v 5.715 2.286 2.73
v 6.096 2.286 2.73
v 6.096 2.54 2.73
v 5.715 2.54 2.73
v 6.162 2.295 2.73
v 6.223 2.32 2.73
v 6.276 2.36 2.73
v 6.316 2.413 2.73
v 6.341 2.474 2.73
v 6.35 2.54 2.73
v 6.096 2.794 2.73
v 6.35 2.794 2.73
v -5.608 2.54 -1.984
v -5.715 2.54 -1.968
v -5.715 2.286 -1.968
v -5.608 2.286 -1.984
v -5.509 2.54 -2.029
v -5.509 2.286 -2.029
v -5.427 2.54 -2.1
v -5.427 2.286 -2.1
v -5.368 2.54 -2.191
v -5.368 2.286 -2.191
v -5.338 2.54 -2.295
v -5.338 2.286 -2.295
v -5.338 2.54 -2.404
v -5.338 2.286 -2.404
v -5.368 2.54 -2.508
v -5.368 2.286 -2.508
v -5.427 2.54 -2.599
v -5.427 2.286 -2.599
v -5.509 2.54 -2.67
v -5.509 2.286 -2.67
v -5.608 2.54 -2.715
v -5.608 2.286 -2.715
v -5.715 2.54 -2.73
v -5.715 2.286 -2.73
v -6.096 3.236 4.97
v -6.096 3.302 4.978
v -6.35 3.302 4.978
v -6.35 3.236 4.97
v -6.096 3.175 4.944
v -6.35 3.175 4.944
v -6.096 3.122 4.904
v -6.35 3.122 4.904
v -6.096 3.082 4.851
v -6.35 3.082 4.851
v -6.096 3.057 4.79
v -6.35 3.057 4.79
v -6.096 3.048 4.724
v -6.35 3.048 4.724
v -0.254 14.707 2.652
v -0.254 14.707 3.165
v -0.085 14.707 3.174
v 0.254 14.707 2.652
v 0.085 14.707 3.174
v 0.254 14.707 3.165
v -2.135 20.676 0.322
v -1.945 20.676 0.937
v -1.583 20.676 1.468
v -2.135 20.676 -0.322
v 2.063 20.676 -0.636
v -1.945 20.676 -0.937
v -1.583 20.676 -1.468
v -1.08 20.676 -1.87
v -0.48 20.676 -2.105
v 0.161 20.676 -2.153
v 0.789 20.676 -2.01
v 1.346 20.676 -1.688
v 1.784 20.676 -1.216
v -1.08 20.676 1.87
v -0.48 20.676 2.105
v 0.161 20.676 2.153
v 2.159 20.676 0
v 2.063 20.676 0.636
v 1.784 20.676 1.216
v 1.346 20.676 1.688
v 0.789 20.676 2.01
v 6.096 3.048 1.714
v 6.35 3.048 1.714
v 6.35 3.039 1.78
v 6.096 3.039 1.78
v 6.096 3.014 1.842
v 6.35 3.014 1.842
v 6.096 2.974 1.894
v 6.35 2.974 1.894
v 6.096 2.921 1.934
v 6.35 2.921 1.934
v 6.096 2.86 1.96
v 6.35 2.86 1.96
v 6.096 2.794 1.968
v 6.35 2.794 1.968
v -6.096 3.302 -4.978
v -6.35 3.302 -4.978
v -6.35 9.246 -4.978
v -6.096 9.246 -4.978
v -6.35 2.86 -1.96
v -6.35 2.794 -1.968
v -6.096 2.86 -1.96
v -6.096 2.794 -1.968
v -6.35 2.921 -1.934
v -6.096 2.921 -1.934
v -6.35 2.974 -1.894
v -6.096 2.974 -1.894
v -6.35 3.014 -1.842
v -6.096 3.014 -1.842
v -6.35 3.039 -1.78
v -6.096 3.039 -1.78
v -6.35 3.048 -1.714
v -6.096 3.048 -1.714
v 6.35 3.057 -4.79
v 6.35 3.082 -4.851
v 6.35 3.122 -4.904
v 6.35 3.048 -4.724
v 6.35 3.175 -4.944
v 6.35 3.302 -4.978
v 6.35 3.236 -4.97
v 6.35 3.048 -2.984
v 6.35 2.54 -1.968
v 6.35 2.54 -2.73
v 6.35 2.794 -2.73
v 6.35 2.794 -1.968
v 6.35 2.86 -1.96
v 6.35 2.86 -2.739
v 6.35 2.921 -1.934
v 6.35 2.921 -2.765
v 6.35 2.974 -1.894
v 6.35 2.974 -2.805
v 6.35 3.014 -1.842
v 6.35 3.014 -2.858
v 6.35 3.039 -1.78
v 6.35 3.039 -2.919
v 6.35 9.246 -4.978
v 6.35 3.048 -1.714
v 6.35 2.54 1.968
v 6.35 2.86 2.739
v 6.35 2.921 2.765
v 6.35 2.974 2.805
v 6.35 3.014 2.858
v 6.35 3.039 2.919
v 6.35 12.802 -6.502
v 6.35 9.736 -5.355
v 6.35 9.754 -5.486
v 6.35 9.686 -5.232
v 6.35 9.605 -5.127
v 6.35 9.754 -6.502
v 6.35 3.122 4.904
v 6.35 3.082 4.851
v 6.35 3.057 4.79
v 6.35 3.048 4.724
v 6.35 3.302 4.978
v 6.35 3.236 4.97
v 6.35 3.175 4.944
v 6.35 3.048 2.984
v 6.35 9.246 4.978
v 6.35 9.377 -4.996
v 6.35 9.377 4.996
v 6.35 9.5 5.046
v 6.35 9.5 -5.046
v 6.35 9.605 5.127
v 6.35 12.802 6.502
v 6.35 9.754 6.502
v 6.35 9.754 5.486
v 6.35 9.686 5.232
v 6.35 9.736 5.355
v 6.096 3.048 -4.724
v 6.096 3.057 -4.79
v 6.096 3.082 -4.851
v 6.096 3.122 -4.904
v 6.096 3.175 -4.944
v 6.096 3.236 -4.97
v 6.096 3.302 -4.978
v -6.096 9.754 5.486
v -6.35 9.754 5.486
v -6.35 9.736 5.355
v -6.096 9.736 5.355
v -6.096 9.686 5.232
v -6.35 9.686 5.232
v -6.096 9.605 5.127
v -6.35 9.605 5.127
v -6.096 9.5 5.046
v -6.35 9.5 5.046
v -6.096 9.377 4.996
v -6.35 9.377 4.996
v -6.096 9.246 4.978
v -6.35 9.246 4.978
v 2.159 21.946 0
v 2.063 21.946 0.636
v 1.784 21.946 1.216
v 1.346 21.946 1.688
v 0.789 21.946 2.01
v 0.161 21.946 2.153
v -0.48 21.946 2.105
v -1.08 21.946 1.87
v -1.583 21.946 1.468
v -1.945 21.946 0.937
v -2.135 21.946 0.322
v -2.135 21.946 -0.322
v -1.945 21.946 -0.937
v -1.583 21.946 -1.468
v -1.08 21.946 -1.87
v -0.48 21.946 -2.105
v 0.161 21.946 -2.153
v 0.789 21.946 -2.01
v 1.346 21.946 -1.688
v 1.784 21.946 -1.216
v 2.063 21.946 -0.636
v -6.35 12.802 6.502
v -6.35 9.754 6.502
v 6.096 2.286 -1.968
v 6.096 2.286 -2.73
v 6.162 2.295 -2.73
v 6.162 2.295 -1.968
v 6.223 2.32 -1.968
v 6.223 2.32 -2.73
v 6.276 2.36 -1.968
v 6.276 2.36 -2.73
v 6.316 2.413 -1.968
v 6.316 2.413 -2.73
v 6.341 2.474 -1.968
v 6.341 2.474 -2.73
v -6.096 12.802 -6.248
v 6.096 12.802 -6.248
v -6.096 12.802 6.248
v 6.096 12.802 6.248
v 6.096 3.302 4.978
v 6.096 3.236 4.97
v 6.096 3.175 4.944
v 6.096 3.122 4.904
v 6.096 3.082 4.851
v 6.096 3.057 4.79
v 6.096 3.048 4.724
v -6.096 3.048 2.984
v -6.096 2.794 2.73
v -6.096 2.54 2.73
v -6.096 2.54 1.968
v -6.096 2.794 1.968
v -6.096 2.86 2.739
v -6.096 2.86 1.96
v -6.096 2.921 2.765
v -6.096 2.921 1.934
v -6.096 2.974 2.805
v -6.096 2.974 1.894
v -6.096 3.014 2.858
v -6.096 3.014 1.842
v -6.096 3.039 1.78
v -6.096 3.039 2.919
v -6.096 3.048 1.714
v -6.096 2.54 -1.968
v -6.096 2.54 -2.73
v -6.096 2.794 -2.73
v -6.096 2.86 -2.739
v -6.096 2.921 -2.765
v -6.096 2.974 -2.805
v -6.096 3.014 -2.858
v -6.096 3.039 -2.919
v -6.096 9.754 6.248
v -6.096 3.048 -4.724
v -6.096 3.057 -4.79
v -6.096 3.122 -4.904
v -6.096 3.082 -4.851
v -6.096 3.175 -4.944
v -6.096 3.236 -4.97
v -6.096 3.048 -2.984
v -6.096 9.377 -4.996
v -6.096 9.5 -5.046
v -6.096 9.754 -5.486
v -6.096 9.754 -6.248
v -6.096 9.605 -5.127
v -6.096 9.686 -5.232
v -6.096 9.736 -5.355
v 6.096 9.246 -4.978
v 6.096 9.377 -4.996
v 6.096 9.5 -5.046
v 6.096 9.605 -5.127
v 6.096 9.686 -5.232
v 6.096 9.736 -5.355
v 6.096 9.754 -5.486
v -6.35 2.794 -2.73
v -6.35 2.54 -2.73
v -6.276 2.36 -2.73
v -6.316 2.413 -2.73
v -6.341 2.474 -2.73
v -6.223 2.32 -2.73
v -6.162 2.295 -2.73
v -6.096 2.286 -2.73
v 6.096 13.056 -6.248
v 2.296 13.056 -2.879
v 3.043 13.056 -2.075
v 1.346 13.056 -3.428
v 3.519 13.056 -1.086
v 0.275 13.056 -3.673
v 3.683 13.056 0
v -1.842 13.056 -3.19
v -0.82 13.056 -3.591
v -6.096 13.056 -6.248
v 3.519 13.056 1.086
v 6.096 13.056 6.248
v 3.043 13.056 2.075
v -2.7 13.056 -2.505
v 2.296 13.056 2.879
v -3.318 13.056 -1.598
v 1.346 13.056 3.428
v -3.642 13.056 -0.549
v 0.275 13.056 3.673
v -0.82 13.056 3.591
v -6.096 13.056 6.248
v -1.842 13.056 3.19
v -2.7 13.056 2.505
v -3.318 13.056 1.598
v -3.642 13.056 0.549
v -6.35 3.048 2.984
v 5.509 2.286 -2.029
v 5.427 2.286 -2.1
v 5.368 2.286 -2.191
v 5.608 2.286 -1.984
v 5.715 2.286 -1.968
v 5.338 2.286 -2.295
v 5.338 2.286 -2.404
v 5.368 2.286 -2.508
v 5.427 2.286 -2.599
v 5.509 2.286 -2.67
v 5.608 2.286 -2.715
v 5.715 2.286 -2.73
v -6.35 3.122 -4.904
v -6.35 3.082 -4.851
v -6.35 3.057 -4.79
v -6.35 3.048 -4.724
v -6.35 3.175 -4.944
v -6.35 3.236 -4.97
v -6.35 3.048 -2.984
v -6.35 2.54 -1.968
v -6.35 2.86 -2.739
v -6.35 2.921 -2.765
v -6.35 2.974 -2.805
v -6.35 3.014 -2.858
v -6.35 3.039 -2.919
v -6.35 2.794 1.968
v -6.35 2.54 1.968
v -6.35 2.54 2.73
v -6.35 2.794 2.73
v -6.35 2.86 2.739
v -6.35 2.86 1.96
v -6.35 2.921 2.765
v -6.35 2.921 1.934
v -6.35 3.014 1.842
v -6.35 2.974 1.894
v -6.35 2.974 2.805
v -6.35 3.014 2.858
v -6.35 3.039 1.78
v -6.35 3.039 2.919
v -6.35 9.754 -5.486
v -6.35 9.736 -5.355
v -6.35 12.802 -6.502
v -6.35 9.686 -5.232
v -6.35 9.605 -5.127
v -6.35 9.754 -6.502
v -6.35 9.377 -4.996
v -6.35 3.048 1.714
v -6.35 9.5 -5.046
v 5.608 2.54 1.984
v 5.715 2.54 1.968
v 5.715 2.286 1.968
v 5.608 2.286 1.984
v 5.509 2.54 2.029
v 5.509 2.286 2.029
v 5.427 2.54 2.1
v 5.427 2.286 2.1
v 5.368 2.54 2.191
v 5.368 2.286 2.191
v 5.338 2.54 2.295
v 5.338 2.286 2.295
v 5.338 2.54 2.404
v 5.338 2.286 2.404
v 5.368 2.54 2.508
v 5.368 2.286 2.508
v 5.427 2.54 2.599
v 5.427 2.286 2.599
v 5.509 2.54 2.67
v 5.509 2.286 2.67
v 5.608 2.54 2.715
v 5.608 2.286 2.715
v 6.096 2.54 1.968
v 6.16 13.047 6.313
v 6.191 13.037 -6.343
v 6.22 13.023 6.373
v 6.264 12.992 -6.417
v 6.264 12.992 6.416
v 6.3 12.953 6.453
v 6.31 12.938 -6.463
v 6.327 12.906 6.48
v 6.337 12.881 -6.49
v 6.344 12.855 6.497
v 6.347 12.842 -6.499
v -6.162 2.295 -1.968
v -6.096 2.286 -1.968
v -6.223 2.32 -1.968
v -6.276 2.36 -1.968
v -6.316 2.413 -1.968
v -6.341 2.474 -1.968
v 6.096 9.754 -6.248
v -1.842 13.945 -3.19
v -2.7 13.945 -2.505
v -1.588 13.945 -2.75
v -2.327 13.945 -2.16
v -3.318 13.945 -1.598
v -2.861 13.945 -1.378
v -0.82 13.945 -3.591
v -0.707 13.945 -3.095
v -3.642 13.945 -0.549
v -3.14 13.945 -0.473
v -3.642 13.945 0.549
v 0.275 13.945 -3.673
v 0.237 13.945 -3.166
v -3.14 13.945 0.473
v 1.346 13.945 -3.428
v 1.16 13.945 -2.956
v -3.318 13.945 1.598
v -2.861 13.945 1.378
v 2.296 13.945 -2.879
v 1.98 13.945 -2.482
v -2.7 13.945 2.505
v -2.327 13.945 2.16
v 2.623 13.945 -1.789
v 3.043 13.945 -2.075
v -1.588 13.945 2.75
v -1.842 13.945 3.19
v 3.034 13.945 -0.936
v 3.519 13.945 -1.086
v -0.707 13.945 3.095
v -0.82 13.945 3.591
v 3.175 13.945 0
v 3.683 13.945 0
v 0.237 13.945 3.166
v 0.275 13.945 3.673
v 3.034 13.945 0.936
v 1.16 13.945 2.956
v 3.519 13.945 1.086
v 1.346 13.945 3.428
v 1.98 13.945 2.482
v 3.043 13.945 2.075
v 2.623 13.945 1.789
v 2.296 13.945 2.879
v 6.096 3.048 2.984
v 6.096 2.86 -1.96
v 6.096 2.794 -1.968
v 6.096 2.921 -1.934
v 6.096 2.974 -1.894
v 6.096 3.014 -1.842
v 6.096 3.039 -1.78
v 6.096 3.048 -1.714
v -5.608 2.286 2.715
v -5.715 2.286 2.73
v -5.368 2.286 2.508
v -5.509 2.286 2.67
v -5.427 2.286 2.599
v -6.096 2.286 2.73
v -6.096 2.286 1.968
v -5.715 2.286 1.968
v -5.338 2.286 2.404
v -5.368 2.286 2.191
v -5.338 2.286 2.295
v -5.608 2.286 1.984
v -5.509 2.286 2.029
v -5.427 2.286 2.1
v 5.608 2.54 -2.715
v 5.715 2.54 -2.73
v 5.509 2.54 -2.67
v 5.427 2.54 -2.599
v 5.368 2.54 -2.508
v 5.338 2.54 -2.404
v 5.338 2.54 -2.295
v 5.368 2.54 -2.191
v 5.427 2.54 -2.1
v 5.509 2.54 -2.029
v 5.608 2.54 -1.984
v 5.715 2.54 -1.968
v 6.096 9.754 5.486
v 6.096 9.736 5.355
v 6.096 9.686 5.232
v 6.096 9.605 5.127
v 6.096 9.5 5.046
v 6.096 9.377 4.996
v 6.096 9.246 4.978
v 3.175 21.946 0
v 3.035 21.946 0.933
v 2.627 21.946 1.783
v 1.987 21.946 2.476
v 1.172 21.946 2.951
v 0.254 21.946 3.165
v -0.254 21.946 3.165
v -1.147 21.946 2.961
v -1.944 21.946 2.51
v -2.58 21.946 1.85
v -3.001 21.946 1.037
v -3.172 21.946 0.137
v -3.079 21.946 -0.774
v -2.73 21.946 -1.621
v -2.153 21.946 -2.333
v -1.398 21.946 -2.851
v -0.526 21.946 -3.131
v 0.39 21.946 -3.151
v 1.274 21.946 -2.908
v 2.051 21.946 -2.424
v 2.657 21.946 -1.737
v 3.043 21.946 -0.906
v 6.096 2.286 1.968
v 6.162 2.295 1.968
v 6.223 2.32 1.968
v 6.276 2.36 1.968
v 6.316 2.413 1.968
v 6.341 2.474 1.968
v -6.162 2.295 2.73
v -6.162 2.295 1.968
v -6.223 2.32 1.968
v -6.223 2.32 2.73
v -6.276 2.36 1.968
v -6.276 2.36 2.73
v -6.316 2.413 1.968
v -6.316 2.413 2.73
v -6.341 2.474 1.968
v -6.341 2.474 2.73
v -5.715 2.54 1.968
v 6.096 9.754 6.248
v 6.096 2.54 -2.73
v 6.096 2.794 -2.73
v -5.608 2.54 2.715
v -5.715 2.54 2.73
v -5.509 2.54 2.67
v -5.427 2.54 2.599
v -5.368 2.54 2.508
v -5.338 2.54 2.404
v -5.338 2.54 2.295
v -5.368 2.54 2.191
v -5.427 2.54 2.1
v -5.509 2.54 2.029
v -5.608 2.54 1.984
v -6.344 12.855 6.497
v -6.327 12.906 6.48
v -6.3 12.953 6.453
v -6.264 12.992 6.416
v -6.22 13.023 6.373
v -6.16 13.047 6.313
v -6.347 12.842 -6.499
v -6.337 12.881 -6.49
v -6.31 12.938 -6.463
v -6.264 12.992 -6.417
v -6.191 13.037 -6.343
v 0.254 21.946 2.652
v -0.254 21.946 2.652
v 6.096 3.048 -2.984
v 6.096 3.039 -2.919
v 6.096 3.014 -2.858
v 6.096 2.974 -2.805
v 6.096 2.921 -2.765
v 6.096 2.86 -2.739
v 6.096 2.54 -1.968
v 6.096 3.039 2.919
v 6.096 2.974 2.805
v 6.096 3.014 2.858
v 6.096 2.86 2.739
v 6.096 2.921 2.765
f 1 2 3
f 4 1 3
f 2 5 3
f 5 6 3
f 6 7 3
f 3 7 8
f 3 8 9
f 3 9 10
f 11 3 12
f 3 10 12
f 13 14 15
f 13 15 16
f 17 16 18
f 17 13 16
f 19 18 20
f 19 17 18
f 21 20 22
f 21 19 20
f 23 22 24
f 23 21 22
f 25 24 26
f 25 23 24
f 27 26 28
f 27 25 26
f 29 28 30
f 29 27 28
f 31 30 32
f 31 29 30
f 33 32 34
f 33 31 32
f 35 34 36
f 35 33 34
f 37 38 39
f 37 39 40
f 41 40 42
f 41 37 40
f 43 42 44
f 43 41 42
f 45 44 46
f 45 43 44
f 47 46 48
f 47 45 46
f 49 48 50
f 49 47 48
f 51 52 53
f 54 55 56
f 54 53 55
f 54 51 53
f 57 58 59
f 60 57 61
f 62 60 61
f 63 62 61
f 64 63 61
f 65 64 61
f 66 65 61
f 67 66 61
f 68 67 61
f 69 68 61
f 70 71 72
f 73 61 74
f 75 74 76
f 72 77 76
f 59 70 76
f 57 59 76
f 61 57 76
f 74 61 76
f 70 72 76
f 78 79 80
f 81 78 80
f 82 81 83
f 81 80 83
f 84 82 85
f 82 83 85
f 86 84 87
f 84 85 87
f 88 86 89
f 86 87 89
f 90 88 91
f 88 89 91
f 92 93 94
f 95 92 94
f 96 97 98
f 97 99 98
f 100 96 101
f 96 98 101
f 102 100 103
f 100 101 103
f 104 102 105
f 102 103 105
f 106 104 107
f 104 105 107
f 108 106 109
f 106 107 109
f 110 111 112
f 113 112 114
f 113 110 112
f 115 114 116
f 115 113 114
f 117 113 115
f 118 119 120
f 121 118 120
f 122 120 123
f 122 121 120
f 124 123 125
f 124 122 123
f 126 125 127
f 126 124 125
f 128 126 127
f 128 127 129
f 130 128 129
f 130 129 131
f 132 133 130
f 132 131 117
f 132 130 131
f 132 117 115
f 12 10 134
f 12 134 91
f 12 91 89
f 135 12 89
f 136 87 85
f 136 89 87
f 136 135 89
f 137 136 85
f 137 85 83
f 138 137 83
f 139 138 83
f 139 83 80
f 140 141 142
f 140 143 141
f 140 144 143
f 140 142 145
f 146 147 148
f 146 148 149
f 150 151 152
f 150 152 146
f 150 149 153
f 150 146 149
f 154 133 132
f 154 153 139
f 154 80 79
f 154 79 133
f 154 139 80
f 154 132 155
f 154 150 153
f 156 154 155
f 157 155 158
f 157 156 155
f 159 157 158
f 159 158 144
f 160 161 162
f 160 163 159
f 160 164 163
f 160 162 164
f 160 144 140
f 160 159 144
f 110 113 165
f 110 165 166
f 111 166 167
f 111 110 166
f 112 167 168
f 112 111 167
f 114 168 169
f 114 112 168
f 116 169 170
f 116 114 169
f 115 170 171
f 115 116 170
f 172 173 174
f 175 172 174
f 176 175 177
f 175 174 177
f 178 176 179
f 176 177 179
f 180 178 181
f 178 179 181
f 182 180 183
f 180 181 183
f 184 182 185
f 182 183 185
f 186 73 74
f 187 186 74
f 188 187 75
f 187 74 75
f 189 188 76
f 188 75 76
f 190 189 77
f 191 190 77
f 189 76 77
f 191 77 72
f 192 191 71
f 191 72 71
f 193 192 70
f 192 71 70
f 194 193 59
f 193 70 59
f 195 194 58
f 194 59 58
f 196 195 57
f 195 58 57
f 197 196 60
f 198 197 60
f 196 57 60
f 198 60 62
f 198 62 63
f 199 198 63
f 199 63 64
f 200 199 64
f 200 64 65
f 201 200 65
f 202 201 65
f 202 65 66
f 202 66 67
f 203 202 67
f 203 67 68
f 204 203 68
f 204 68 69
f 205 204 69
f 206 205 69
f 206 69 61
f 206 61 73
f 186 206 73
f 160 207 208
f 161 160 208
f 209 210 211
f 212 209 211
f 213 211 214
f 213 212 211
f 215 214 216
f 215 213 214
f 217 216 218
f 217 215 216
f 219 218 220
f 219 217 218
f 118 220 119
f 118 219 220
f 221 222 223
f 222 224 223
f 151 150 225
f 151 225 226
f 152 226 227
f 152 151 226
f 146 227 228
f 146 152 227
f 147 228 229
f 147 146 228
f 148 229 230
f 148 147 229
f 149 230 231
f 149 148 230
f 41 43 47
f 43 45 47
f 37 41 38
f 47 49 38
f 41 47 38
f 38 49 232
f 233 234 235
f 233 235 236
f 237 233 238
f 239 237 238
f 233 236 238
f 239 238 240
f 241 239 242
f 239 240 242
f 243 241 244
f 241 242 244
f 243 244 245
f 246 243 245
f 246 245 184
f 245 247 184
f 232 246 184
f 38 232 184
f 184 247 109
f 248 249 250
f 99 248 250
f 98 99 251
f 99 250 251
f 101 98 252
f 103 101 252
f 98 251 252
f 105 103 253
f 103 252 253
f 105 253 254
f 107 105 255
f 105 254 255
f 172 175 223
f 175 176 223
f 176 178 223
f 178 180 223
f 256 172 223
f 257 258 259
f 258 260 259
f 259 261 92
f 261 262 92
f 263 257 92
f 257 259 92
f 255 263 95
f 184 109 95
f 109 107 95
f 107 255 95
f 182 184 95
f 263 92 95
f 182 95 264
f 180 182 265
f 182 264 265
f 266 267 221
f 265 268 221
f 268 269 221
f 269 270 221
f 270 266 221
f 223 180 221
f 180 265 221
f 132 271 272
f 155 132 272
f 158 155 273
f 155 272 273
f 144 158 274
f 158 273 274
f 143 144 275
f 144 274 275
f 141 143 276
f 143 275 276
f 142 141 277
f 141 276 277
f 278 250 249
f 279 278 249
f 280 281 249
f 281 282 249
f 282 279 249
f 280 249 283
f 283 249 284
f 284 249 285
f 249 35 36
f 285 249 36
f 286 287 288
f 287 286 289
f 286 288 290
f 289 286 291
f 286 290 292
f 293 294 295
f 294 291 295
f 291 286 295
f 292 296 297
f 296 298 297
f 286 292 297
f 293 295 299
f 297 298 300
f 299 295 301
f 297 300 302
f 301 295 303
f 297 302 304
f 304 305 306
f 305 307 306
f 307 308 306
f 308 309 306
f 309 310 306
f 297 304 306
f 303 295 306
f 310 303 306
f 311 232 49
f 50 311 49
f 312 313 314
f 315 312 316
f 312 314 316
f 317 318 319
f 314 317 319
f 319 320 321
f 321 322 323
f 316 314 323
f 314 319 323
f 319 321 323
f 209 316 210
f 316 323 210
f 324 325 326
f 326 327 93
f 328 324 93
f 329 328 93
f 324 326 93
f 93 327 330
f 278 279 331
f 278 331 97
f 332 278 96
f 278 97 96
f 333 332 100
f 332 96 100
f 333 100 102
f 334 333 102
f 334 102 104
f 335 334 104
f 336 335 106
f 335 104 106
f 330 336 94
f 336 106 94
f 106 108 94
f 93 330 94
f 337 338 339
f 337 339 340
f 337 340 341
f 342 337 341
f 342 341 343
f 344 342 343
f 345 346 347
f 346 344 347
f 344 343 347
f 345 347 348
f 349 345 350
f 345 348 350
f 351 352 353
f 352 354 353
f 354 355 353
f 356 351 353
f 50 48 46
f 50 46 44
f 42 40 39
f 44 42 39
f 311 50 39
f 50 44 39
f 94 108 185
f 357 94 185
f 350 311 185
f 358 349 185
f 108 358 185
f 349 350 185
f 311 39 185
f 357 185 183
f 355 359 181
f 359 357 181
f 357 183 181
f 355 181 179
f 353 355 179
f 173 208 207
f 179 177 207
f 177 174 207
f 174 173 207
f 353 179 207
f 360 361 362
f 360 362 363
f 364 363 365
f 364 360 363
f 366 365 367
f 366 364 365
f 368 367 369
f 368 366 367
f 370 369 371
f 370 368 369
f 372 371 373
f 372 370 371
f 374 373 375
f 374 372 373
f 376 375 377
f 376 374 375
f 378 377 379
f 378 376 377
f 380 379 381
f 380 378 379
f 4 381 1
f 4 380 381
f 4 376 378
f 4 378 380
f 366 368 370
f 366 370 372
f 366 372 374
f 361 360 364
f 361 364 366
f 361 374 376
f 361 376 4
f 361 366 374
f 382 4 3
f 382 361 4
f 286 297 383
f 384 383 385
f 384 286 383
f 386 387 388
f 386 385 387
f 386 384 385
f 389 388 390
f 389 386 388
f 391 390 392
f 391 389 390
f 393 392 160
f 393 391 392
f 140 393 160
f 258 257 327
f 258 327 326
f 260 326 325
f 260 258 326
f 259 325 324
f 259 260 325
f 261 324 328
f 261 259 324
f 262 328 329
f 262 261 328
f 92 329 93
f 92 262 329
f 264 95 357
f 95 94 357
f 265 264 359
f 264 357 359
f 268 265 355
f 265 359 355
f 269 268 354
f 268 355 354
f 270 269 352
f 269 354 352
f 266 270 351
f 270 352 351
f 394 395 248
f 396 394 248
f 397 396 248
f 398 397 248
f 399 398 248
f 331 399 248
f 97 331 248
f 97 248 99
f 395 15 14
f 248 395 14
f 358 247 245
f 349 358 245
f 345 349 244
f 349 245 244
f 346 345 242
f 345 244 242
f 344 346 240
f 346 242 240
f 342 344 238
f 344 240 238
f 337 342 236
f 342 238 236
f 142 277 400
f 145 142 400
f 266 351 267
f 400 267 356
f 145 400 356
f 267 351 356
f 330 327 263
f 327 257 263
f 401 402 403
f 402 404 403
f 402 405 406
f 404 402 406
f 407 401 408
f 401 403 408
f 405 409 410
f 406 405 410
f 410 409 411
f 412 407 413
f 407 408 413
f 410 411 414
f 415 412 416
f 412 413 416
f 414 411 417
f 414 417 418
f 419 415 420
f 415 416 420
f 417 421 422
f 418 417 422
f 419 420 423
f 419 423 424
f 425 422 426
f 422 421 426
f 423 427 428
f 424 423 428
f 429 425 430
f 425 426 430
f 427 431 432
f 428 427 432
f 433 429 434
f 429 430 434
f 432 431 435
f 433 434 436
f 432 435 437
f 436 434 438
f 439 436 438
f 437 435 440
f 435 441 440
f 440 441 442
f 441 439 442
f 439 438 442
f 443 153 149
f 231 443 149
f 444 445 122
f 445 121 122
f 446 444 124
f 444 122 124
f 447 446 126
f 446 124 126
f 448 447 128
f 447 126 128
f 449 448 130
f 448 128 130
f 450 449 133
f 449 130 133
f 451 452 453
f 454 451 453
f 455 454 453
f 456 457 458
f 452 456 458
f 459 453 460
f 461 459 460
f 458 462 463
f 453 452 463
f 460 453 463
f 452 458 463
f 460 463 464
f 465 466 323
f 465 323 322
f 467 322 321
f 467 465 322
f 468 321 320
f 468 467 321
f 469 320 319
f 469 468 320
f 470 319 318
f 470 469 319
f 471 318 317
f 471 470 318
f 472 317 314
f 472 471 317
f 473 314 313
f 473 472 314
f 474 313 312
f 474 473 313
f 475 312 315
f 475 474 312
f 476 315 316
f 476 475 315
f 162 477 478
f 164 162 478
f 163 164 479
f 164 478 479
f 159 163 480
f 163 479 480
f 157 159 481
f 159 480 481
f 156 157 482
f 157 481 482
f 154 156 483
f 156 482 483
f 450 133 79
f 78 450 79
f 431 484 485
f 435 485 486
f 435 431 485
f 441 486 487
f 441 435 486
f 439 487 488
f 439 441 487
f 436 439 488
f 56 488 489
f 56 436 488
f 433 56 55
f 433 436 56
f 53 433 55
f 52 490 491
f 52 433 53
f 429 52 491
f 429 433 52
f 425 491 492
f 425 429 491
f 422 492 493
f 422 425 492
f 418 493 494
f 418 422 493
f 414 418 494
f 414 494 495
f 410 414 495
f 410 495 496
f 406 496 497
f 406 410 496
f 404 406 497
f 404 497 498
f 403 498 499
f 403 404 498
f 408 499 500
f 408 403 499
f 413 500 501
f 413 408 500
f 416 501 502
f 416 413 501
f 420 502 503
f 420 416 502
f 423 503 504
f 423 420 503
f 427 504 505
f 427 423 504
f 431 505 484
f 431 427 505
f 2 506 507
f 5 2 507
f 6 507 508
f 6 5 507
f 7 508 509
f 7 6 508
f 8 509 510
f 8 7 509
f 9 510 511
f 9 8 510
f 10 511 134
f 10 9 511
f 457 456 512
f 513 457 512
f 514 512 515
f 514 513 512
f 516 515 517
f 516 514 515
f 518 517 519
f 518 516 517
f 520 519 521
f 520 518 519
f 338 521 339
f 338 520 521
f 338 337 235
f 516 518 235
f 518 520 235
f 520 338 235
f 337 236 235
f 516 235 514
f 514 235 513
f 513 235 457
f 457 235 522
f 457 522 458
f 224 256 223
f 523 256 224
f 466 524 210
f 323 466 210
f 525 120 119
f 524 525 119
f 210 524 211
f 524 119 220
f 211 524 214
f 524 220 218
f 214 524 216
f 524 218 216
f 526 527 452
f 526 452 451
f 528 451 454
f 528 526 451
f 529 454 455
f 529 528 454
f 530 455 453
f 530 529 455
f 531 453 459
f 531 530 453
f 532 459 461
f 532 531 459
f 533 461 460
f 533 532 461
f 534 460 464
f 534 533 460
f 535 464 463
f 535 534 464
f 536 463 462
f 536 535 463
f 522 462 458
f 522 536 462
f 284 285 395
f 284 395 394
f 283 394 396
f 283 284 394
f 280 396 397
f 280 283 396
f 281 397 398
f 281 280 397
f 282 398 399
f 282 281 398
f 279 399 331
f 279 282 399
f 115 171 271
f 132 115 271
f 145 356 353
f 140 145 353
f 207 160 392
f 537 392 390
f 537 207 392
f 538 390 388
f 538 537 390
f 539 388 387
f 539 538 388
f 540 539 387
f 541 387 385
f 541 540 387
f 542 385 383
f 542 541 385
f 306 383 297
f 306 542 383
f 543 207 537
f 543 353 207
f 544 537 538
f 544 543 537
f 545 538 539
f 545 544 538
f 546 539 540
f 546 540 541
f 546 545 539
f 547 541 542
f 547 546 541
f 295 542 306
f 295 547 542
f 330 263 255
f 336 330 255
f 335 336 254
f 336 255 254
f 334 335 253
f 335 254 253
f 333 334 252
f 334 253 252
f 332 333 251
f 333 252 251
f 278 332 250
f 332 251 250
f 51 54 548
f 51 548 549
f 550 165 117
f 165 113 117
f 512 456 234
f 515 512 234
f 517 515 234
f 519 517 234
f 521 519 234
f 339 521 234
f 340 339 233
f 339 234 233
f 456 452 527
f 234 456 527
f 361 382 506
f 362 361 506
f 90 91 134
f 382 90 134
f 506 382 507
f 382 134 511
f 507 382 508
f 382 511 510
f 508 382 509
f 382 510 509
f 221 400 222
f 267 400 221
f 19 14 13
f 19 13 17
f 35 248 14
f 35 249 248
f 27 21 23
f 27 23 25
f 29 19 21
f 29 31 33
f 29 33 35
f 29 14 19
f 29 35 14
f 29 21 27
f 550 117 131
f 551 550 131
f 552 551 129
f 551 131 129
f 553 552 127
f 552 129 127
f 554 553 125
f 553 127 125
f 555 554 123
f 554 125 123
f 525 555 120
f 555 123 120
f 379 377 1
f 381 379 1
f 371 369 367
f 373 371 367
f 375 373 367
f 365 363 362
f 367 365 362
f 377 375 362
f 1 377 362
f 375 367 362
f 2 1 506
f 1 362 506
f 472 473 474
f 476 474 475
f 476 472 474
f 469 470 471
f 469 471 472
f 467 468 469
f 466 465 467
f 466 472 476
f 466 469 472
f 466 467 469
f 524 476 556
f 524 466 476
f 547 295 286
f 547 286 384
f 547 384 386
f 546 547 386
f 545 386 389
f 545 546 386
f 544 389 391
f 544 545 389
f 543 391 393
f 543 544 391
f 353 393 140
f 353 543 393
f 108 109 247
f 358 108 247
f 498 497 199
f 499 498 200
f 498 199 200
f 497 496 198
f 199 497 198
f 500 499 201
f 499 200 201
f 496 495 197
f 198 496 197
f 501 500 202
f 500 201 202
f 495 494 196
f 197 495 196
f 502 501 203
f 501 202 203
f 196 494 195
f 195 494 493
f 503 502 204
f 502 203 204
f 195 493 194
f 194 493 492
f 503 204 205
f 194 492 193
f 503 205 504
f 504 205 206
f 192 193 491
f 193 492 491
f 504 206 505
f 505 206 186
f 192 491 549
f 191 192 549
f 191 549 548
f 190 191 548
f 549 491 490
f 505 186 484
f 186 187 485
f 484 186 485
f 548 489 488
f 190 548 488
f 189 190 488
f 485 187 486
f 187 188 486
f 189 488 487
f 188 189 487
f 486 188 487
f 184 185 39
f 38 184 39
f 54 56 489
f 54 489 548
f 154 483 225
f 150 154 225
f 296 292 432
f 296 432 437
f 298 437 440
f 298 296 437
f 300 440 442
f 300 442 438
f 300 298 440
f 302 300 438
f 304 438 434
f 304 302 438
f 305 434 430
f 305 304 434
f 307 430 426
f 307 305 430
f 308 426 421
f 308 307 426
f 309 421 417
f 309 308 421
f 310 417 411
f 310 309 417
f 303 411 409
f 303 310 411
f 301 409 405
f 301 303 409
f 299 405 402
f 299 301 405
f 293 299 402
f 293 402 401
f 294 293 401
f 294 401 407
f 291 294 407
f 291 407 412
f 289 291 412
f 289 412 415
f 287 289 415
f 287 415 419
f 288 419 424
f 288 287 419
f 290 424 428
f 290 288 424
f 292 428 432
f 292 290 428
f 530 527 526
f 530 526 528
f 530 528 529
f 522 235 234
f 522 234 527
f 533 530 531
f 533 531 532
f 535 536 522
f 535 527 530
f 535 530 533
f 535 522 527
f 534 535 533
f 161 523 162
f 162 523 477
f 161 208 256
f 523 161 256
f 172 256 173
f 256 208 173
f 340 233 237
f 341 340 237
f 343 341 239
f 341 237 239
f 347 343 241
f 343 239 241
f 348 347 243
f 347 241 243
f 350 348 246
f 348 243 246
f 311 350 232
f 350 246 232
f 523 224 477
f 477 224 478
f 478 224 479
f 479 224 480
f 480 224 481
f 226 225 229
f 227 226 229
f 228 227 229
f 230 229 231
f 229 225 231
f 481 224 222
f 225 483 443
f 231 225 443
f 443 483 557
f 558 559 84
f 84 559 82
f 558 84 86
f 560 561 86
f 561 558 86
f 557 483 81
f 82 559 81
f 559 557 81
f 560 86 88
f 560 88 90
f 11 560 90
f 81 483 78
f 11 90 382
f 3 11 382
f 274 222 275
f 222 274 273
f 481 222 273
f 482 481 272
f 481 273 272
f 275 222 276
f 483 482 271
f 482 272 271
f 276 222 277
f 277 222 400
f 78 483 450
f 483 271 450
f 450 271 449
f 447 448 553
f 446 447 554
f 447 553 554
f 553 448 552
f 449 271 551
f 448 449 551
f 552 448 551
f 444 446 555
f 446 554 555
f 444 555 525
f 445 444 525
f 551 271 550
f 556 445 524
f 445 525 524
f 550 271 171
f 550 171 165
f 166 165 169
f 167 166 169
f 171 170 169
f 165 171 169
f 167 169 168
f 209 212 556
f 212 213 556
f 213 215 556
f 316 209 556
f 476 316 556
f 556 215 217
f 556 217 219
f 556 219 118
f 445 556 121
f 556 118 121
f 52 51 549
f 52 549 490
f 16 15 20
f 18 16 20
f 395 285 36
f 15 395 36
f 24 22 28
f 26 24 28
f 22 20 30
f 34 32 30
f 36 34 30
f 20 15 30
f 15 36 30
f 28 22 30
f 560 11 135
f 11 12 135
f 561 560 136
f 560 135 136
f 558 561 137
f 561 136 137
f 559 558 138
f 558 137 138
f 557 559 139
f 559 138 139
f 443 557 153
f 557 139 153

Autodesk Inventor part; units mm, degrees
sketch "Sketch_1" plane through (0, 0, 0) normal (1, 0, 0) x (0, 1, 0)
  line L0 (12.8016, 6.5024) -> (9.7536, 6.5024)
  line L1 (9.7536, 6.5024) -> (9.7536, 5.4864)
  arc A0 (9.2456, 4.9784) -> (9.7536, 5.4864) centre (9.2456, 5.4864) ccw
  line L2 (9.2456, 4.9784) -> (2.54, 4.9784)
  line L3 (2.54, 4.9784) -> (2.54, -4.9784)
  line L4 (2.54, -4.9784) -> (9.2456, -4.9784)
  arc A1 (9.7536, -5.4864) -> (9.2456, -4.9784) centre (9.2456, -5.4864) ccw
  line L5 (9.7536, -5.4864) -> (9.7536, -6.5024)
  line L6 (9.7536, -6.5024) -> (12.8016, -6.5024)
  arc A2 (12.8016, -6.5024) -> (13.0556, -6.2484) centre (12.8016, -6.2484) ccw
  line L7 (13.0556, -6.2484) -> (13.0556, 6.2484)
  arc A3 (13.0556, 6.2484) -> (12.8016, 6.5024) centre (12.8016, 6.2484) ccw
extrude "Extrusion1" add sketch "Sketch_1" along normal mid plane 12.7
sketch "Sketch_2" plane through (0, 0, 0) normal (0, 1, 0) x (-1, 0, 0)
  line L0 (6.096, 6.2484) -> (-6.096, 6.2484)
  line L1 (-6.096, 6.2484) -> (-6.096, -6.2484)
  line L2 (-6.096, -6.2484) -> (6.096, -6.2484)
  line L3 (6.096, -6.2484) -> (6.096, 6.2484)
extrude "Extrusion2" cut sketch "Sketch_2" along normal blind 12.8016
sketch "Sketch_3" plane through (0, 0, 0) normal (0, 0, 1) x (1, 0, 0)
  line L0 (-6.35, 15.24) -> (-6.35, 12.8016)
  arc A0 (-6.096, 13.0556) -> (-6.35, 12.8016) centre (-6.096, 12.8016) ccw
  line L1 (-6.096, 13.0556) -> (6.096, 13.0556)
  arc A1 (6.35, 12.8016) -> (6.096, 13.0556) centre (6.096, 12.8016) ccw
  line L2 (6.35, 12.8016) -> (6.35, 15.24)
  line L3 (6.35, 15.24) -> (-6.35, 15.24)
extrude "Extrusion3" cut sketch "Sketch_3" along normal mid plane 25.6032
sketch "Sketch_4" plane through (0, 2.54, 0) normal (0, 1, 0) x (1, 0, 0)
  line L0 (-6.096, 5.4864) -> (-6.096, -5.4864)
  line L1 (-6.096, -5.4864) -> (-6.35, -5.4864)
  line L2 (-6.35, -5.4864) -> (-6.35, 5.4864)
  line L3 (-6.35, 5.4864) -> (-6.096, 5.4864)
  line L4 (-6.096, 5.4864) -> (-6.096, -5.4864)
revolve "Revolution1" add sketch "Sketch_4" angle 90 about axis through (-6.096, 2.54, -5.4864) along (0, 0, 1)
sketch "Sketch_5" plane through (0, 2.54, 0) normal (0, 1, 0) x (1, 0, 0)
  line L0 (6.096, -5.4864) -> (6.096, 5.4864)
  line L1 (6.096, 5.4864) -> (6.35, 5.4864)
  line L2 (6.35, 5.4864) -> (6.35, -5.4864)
  line L3 (6.35, -5.4864) -> (6.096, -5.4864)
  line L4 (6.096, -5.4864) -> (6.096, 5.4864)
revolve "Revolution2" add sketch "Sketch_5" angle 90 about axis through (6.096, 2.54, 5.4864) along (0, 0, -1)
sketch "Sketch_6" plane through (0, 2.54, 0) normal (0, 1, 0) x (1, 0, 0)
  line L0 (-6.096, 2.7305) -> (-6.096, -2.7305)
  line L1 (-6.096, -2.7305) -> (-5.715, -2.7305)
  arc A0 (-5.715, -2.7305) -> (-5.715, -1.9685) centre (-5.715, -2.3495) ccw
  line L2 (-5.715, -1.9685) -> (-5.715, 1.9685)
  arc A1 (-5.715, 1.9685) -> (-5.715, 2.7305) centre (-5.715, 2.3495) ccw
  line L3 (-5.715, 2.7305) -> (-6.096, 2.7305)
extrude "Extrusion4" add sketch "Sketch_6" against normal blind 0.254
sketch "Sketch_7" plane through (0, 2.54, 0) normal (0, 1, 0) x (1, 0, 0)
  arc A0 (5.715, 2.7305) -> (5.715, 1.9685) centre (5.715, 2.3495) ccw
  line L0 (5.715, 1.9685) -> (5.715, -1.9685)
  arc A1 (5.715, -1.9685) -> (5.715, -2.7305) centre (5.715, -2.3495) ccw
  line L1 (5.715, -2.7305) -> (6.096, -2.7305)
  line L2 (6.096, -2.7305) -> (6.096, 2.7305)
  line L3 (6.096, 2.7305) -> (5.715, 2.7305)
extrude "Extrusion5" add sketch "Sketch_7" against normal blind 0.254
sketch "Sketch_8" plane through (6.35, 0, 0) normal (1, 0, 0) x (0, 0, -1)
  line L0 (-7.1863, 0) -> (7.752, 0)
  line L1 (7.752, 0) -> (7.752, 3.302)
  line L2 (7.752, 3.302) -> (4.9784, 3.302)
  arc A0 (4.7244, 3.048) -> (4.9784, 3.302) centre (4.7244, 3.302) ccw
  line L3 (4.7244, 3.048) -> (2.9845, 3.048)
  arc A1 (2.9845, 3.048) -> (2.7305, 2.794) centre (2.9845, 2.794) ccw
  line L4 (2.7305, 2.794) -> (2.7305, 2.286)
  line L5 (2.7305, 2.286) -> (1.9685, 2.286)
  line L6 (1.9685, 2.286) -> (1.9685, 2.794)
  arc A2 (1.9685, 2.794) -> (1.7145, 3.048) centre (1.7145, 2.794) ccw
  line L7 (1.7145, 3.048) -> (-1.7145, 3.048)
  arc A3 (-1.7145, 3.048) -> (-1.9685, 2.794) centre (-1.7145, 2.794) ccw
  line L8 (-1.9685, 2.794) -> (-1.9685, 2.286)
  line L9 (-1.9685, 2.286) -> (-2.7305, 2.286)
  line L10 (-2.7305, 2.286) -> (-2.7305, 2.794)
  arc A4 (-2.7305, 2.794) -> (-2.9845, 3.048) centre (-2.9845, 2.794) ccw
  line L11 (-2.9845, 3.048) -> (-4.7244, 3.048)
  arc A5 (-4.9784, 3.302) -> (-4.7244, 3.048) centre (-4.7244, 3.302) ccw
  line L12 (-4.9784, 3.302) -> (-7.1863, 3.302)
  line L13 (-7.1863, 3.302) -> (-7.1863, 0)
extrude "Extrusion6" cut sketch "Sketch_8" against normal blind 25.4
sketch "Sketch_17" plane through (0, 0, 0) normal (0, 0, 1) x (1, 0, 0)
  line L0 (0, 13.0556) -> (0, 21.9456)
  line L1 (0, 21.9456) -> (3.175, 21.9456)
  line L2 (3.175, 21.9456) -> (3.175, 13.9446)
  line L3 (3.175, 13.9446) -> (3.683, 13.9446)
  line L4 (3.683, 13.9446) -> (3.683, 13.0556)
  line L5 (3.683, 13.0556) -> (0, 13.0556)
  line L6 (0, 13.0556) -> (0, 21.9456)
revolve "Revolution3" add sketch "Sketch_17" angle 360 about axis through (0, 13.0556, 0) along (0, -1, 0)
thread "Thread1" size "1/4-24 UNS" class "2A" standard "ANSI Unified Screw Threads" full length
sketch "Sketch_19" plane through (0, 0, 0) normal (0, 0, 1) x (1, 0, 0)
  line L0 (0, 20.6756) -> (0, 21.9456)
  line L1 (0, 21.9456) -> (2.159, 21.9456)
  line L2 (2.159, 21.9456) -> (2.159, 20.6756)
  line L3 (2.159, 20.6756) -> (0, 20.6756)
  line L4 (0, 20.6756) -> (0, 21.9456)
revolve "Revolution4" cut sketch "Sketch_19" angle 360 about axis through (0, 20.6756, 0) along (0, -1, 0)
sketch "Sketch_35" plane through (0, 14.7066, 0) normal (0, 1, 0) x (1, 0, 0)
  line L0 (-0.254, -3.175) -> (0.254, -3.175)
  line L1 (0.254, -3.175) -> (0.254, -2.6518)
  line L2 (0.254, -2.6518) -> (-0.254, -2.6518)
  line L3 (-0.254, -2.6518) -> (-0.254, -3.175)
extrude "Extrusion7" cut sketch "Sketch_35" along normal blind 20.32
ref_plane "at507h_XY" through (0, 16.3576, 0) normal (0, 1, 0) x (1, 0, 0)
ref_plane "at507h_YZ" through (0, 16.3576, 0) normal (1, 0, 0) x (0, 0, -1)
ref_plane "at507h_ZX" through (0, 16.3576, 0) normal (0, 0, -1) x (0, 1, 0)
ref_plane "at507h_dual_XY" through (-2.4003, 16.3576, 0) normal (0, 1, 0) x (1, 0, 0)
ref_plane "at507h_dual_YZ" through (-2.4003, 16.3576, 0) normal (1, 0, 0) x (0, 0, -1)
ref_plane "at507h_dual_ZX" through (-2.4003, 16.3576, 0) normal (0, 0, -1) x (0, 1, 0)
ref_plane "at509_XY" through (0, 15.7099, 0) normal (0, 1, 0) x (1, 0, 0)
ref_plane "at509_YZ" through (0, 15.7099, 0) normal (1, 0, 0) x (0, 0, -1)
ref_plane "at509_ZX" through (0, 15.7099, 0) normal (0, 0, -1) x (0, 1, 0)
ref_plane "at509_dual_XY" through (-2.4003, 15.7099, 0) normal (0, 1, 0) x (1, 0, 0)
ref_plane "at509_dual_YZ" through (-2.4003, 15.7099, 0) normal (1, 0, 0) x (0, 0, -1)
ref_plane "at509_dual_ZX" through (-2.4003, 15.7099, 0) normal (0, 0, -1) x (0, 1, 0)
ref_plane "at513h_XY" through (0, 14.7066, 0) normal (0, 1, 0) x (1, 0, 0)
ref_plane "at513h_YZ" through (0, 14.7066, 0) normal (1, 0, 0) x (0, 0, -1)
ref_plane "at513h_ZX" through (0, 14.7066, 0) normal (0, 0, -1) x (0, 1, 0)
ref_plane "at513h_dual_XY" through (-2.4003, 14.7066, 0) normal (0, 1, 0) x (1, 0, 0)
ref_plane "at513h_dual_YZ" through (-2.4003, 14.7066, 0) normal (1, 0, 0) x (0, 0, -1)
ref_plane "at513h_dual_ZX" through (-2.4003, 14.7066, 0) normal (0, 0, -1) x (0, 1, 0)
ref_plane "body_c_to_bracket_XY" through (0, 13.0556, 0) normal (0, -1, 0) x (1, 0, 0)
ref_plane "body_c_to_bracket_YZ" through (0, 13.0556, 0) normal (1, 0, 0) x (0, 0, 1)
ref_plane "body_c_to_bracket_ZX" through (0, 13.0556, 0) normal (0, 0, 1) x (0, -1, 0)
ref_plane "body_cover_to_body_XY" through (0, 12.8016, 0) normal (0, 1, 0) x (1, 0, 0)
ref_plane "body_cover_to_body_YZ" through (0, 12.8016, 0) normal (1, 0, 0) x (0, 0, -1)
ref_plane "body_cover_to_body_ZX" through (0, 12.8016, 0) normal (0, 0, -1) x (0, 1, 0)
ref_plane "body_cover_to_toggle_XY" through (0, 18.1356, 0) normal (0, 1, 0) x (1, 0, 0)
ref_plane "body_cover_to_toggle_YZ" through (0, 18.1356, 0) normal (1, 0, 0) x (0, 0, -1)
ref_plane "body_cover_to_toggle_ZX" through (0, 18.1356, 0) normal (0, 0, -1) x (0, 1, 0)
ref_plane "body_cover_to_toggle2_XY" through (-2.4003, 18.1356, 0) normal (0, 1, 0) x (1, 0, 0)
ref_plane "body_cover_to_toggle2_YZ" through (-2.4003, 18.1356, 0) normal (1, 0, 0) x (0, 0, -1)
ref_plane "body_cover_to_toggle2_ZX" through (-2.4003, 18.1356, 0) normal (0, 0, -1) x (0, 1, 0)
ref_plane "st513h_2_XY" through (0, 17.5006, 0) normal (0, 1, 0) x (1, 0, 0)
ref_plane "st513h_2_YZ" through (0, 17.5006, 0) normal (1, 0, 0) x (0, 0, -1)
ref_plane "st513h_2_ZX" through (0, 17.5006, 0) normal (0, 0, -1) x (0, 1, 0)
ref_plane "st513h_2_dual_XY" through (-2.4003, 17.5006, 0) normal (0, 1, 0) x (1, 0, 0)
ref_plane "st513h_2_dual_YZ" through (-2.4003, 17.5006, 0) normal (1, 0, 0) x (0, 0, -1)
ref_plane "st513h_2_dual_ZX" through (-2.4003, 17.5006, 0) normal (0, 0, -1) x (0, 1, 0)
properties part number "M211LW01-body-cover"
